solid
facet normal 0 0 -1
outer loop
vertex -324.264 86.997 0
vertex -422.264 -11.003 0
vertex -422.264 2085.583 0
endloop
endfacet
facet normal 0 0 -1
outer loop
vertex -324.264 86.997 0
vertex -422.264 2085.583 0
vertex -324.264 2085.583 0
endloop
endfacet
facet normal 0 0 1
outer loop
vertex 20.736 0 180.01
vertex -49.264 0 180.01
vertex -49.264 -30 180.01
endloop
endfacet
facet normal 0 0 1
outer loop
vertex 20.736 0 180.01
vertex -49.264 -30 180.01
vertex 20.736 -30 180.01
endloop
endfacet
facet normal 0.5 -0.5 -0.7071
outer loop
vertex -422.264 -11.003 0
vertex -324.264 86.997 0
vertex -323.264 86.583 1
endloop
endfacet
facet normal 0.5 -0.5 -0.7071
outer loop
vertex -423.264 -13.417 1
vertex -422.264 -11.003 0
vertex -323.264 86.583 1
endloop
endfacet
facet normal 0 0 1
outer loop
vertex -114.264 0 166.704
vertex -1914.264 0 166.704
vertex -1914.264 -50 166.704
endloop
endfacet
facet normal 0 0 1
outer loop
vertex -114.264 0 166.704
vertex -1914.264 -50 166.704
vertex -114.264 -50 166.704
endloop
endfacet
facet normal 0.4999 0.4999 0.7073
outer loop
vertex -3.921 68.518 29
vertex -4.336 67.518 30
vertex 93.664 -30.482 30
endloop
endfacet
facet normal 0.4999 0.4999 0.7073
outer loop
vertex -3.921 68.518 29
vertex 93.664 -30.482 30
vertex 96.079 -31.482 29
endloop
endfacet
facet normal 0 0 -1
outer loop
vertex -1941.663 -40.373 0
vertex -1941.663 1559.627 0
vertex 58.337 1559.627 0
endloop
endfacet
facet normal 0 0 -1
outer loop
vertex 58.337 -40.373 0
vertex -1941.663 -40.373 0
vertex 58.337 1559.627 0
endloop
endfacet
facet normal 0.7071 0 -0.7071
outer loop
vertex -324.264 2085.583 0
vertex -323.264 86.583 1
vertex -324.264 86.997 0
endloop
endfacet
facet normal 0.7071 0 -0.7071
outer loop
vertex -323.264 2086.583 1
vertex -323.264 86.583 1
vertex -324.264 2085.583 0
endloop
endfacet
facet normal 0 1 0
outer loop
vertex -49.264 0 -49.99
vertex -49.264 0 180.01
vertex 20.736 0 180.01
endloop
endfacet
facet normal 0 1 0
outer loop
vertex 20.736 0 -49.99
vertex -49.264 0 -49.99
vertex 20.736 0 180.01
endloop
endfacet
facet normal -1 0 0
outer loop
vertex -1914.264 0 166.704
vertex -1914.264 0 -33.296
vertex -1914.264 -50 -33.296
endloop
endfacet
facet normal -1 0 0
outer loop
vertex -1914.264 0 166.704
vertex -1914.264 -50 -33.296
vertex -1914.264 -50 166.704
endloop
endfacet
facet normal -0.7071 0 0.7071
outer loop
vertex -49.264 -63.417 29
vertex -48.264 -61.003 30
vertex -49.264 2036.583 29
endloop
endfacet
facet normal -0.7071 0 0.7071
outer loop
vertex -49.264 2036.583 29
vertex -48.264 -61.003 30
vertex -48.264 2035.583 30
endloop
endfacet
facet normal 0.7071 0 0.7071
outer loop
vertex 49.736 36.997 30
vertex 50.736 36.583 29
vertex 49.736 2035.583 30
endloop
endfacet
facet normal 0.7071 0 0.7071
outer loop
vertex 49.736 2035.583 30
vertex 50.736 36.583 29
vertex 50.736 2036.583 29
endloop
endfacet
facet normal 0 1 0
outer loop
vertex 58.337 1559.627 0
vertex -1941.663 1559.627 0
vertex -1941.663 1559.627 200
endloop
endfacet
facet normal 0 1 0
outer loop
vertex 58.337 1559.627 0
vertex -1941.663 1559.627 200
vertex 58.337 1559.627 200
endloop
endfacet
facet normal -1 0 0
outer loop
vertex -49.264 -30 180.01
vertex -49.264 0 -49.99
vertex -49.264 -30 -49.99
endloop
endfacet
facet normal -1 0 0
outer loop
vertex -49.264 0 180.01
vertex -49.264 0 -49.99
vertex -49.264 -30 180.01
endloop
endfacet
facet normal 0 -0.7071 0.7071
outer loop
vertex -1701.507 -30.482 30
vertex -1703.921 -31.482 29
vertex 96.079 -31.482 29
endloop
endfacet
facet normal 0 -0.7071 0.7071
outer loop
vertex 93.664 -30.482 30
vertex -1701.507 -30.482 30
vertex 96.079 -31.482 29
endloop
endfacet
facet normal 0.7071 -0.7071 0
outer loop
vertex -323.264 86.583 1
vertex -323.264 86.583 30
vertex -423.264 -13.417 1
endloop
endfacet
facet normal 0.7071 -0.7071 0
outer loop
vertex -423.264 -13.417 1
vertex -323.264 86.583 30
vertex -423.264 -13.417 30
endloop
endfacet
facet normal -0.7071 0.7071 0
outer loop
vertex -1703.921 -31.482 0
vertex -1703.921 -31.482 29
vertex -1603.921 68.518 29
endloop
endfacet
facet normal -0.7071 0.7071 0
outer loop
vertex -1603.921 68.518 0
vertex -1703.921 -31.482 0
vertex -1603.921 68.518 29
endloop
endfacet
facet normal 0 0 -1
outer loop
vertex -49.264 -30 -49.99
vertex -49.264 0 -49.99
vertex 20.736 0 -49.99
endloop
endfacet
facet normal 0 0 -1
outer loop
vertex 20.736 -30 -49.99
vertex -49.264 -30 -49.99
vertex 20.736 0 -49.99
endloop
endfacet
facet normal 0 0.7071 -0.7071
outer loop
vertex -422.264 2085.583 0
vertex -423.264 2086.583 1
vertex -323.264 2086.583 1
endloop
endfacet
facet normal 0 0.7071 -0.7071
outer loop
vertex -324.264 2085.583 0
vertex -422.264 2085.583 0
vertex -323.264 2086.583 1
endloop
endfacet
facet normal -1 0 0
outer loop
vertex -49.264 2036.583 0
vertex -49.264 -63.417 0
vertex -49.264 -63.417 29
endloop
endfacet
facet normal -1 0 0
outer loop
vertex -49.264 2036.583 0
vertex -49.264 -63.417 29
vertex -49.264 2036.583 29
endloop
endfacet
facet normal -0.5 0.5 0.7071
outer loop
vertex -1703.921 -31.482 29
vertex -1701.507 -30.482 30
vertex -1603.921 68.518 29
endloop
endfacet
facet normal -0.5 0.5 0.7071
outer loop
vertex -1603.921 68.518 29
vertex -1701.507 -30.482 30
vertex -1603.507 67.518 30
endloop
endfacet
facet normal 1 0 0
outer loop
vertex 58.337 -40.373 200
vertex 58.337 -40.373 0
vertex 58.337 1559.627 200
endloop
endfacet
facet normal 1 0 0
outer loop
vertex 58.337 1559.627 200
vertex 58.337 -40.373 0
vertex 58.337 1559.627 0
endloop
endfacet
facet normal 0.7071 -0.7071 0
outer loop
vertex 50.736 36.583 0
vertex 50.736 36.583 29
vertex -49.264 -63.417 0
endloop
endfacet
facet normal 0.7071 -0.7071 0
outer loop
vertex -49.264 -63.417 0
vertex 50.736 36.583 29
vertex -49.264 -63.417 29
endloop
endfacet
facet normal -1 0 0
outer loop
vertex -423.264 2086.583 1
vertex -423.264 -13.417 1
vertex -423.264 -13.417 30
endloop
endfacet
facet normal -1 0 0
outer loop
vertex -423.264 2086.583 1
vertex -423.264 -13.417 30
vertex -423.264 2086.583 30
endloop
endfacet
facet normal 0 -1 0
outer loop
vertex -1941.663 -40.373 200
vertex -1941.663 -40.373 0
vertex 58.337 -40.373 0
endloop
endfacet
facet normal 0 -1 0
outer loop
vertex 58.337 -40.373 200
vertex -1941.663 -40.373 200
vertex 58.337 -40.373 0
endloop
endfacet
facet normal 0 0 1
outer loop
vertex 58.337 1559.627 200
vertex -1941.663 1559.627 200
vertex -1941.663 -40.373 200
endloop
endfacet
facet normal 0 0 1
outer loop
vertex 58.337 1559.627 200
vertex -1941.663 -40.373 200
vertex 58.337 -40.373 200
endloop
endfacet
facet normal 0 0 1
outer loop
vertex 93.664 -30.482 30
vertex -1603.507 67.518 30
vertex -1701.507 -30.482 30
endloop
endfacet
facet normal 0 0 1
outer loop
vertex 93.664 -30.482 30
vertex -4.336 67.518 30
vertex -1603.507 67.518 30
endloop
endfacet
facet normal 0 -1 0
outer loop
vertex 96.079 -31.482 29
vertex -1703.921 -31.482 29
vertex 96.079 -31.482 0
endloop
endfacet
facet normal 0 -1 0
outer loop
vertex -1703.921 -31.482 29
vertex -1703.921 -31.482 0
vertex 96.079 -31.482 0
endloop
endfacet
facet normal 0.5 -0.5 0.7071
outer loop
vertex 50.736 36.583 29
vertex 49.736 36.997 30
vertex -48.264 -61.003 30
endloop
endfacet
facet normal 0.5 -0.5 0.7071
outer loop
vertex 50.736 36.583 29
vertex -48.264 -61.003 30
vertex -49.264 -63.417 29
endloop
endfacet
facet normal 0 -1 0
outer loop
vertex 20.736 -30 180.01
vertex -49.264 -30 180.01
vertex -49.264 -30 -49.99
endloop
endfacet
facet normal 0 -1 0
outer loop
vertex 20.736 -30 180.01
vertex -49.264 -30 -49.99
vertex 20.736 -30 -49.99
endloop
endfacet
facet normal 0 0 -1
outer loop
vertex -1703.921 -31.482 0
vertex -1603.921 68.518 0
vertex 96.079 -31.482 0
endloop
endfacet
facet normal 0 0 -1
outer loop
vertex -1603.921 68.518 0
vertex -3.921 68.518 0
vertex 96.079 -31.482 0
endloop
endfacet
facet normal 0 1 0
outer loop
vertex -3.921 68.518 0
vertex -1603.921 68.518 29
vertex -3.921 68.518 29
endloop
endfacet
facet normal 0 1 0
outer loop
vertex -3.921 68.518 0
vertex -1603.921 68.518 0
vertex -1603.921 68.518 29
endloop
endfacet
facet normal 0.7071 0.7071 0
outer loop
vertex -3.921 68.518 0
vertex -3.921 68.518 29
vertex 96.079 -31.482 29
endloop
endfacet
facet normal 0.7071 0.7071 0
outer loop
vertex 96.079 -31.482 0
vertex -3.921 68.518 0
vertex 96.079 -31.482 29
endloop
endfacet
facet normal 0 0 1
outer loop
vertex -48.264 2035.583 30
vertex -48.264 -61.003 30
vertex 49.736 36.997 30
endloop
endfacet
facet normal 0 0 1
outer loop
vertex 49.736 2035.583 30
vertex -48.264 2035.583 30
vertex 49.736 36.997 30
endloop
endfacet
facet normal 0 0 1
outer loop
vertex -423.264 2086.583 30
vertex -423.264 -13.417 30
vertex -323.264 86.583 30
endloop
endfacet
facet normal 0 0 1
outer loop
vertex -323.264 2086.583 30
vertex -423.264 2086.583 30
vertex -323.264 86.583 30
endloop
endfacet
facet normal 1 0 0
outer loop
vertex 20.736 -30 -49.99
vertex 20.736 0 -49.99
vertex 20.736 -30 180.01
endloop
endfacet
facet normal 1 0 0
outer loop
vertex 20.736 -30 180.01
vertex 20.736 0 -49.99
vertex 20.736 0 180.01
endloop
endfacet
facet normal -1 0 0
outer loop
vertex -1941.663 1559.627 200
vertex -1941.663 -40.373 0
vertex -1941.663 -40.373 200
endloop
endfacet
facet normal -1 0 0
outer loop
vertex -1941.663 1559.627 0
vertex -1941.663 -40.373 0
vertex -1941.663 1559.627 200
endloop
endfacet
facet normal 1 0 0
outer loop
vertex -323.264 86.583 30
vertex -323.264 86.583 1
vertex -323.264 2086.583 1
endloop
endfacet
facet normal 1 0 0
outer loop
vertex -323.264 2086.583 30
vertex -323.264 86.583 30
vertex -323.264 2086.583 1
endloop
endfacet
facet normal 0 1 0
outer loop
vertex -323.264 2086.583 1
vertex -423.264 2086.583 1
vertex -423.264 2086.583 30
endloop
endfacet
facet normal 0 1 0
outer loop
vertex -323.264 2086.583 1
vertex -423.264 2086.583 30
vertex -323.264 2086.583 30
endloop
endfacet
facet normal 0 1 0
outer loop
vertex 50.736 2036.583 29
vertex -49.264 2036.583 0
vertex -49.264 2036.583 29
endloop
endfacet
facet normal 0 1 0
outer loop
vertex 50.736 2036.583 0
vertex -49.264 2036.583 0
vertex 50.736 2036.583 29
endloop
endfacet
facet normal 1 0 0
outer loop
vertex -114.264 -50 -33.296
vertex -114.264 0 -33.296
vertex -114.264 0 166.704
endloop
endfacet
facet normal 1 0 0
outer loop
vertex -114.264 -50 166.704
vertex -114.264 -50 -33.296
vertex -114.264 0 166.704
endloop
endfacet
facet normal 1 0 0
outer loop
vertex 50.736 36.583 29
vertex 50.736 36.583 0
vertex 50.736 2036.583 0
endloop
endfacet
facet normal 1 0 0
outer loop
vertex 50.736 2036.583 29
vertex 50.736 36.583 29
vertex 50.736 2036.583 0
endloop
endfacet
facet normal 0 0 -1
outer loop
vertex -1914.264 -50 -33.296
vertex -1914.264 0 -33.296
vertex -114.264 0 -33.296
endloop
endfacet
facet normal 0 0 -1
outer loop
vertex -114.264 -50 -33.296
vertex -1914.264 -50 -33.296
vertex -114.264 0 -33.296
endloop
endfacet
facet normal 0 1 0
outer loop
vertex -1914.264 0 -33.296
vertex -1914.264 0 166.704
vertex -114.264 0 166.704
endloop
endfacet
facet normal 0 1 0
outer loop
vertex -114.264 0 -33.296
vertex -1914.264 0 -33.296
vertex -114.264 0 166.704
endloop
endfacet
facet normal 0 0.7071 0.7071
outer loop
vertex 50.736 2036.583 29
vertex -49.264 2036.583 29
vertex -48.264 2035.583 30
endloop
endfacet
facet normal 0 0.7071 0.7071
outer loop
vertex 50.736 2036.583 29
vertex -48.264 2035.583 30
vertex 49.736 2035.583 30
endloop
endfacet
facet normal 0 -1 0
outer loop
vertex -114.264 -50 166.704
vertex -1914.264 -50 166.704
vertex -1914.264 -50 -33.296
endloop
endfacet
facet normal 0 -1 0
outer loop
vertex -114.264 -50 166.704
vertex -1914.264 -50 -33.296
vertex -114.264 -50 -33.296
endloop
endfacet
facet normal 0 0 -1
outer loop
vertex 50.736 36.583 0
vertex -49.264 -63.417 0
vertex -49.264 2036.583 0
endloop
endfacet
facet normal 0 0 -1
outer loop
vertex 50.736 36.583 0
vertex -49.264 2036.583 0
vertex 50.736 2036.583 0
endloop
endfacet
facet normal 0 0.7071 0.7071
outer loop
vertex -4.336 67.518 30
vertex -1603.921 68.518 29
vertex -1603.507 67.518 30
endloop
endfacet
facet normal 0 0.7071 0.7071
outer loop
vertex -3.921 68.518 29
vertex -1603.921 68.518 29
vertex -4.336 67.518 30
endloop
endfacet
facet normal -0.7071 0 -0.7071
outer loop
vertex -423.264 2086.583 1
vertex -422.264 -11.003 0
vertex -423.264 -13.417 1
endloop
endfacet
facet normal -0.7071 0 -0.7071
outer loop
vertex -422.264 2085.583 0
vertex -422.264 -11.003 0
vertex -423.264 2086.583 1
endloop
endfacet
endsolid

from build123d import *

# Parameters (mm, degrees)
F0_W      = 1800
F0_H      = 200
F1_DEPTH  = 50
F2_W      = 100
F2_H      = 2100
F3_DEPTH  = 30
F4_W      = 70
F4_H      = 230
F5_DEPTH  = 30
F6_W      = 2000
F6_H      = 1600
F7_DEPTH  = 200
F8_W      = 1800
F8_H      = 100
F9_DEPTH  = 30
F11_DEPTH = 34
F12_SIZE  = 1
F13_SIZE  = 1
F14_SIZE  = 1
F16_DEPTH = 35
F18_SIZE  = 1
F19_SIZE  = 1
F20_SIZE  = 1
F21_SIZE  = 1


with BuildPart() as f1:
    # F0 (on Front) → F1 (new body)
    with BuildSketch(Plane.XZ):
        with Locations((-1014.2641052604, 66.7036272585)):
            Rectangle(F0_W, F0_H)
    extrude(amount=F1_DEPTH)


with BuildPart() as f3:
    # F2 (on Top) → F3 (new body)
    with BuildSketch(Plane.XY):
        with Locations((0.7358856499, 986.5826621652)):
            Rectangle(F2_W, F2_H)
    extrude(amount=F3_DEPTH)

    # F15 (on face) → F16 (cut)
    with BuildSketch(Plane.XY.offset(30)):
        Polygon((50.7358856499, -63.4173378348), (50.7358856499, 36.5826621652), (-49.2641143501, -63.4173378348), align=None)
    extrude(amount=-F16_DEPTH, mode=Mode.SUBTRACT)


with BuildPart() as f5:
    # F4 (on Front) → F5 (new body)
    with BuildSketch(Plane.XZ):
        with Locations((-14.2641143501, 65.0100798905)):
            Rectangle(F4_W, F4_H)
    extrude(amount=F5_DEPTH)


with BuildPart() as f7:
    # F6 (on Top) → F7 (new body)
    with BuildSketch(Plane.XY):
        with Locations((-941.6633024812, 759.6270173788)):
            Rectangle(F6_W, F6_H)
    extrude(amount=F7_DEPTH)


with BuildPart() as f9:
    # F8 (on Top) → F9 (new body)
    with BuildSketch(Plane.XY):
        with Locations((-803.9213657379, 18.5181453824)):
            Rectangle(F8_W, F8_H)
    extrude(amount=F9_DEPTH)

    # F10 (on face) → F11 (cut)
    with BuildSketch(Plane.XY.offset(30)):
        Polygon((-1703.9213657379, -31.4818546176), (-1603.9213657379, 68.5181453824), (-1703.9213657379, 68.5181453824), (-1703.9213657379, 63.0305334926), align=None)
        Polygon((96.0786342621, 68.5181453824), (-3.9213657379, 68.5181453824), (96.0786342621, -31.4818546176), align=None)
    extrude(amount=-F11_DEPTH, mode=Mode.SUBTRACT)

    # F12
    f12_edges = [f9.edges().sort_by_distance(p)[0] for p in [
        (-1653.921366, 18.518145, 30),
        (46.078634, 18.518145, 30),
    ]]
    chamfer(f12_edges, length=F12_SIZE)

    # F13
    f13_edges = [f9.edges().sort_by_distance(p)[0] for p in [
        (-803.921366, 68.518145, 30),
    ]]
    chamfer(f13_edges, length=F13_SIZE)

    # F14
    f14_edges = [f9.edges().sort_by_distance(p)[0] for p in [
        (-803.921366, -31.481855, 30),
    ]]
    chamfer(f14_edges, length=F14_SIZE)


with BuildPart() as f17_1:
    # F17: copy of F3
    add(f3.part.moved(Location((-374, 50, 0))))

    # F20
    f20_edges = [f17_1.edges().sort_by_distance(p)[0] for p in [
        (-373.264114, 36.582662, 0),
        (-323.264114, 1086.582662, 0),
    ]]
    chamfer(f20_edges, length=F20_SIZE)

    # F21
    f21_edges = [f17_1.edges().sort_by_distance(p)[0] for p in [
        (-373.764114, 2086.582662, 0),
        (-423.264114, 1037.289769, 0),
    ]]
    chamfer(f21_edges, length=F21_SIZE)


with BuildPart() as f3_1:
    add(f3.part)

    # F18
    f18_edges = [f3_1.edges().sort_by_distance(p)[0] for p in [
        (50.735886, 1036.582662, 30),
        (0.735886, -13.417338, 30),
    ]]
    chamfer(f18_edges, length=F18_SIZE)

    # F19
    f19_edges = [f3_1.edges().sort_by_distance(p)[0] for p in [
        (-49.264114, 987.289769, 30),
        (0.235886, 2036.582662, 30),
    ]]
    chamfer(f19_edges, length=F19_SIZE)


solid = Compound([f1.part, f5.part, f7.part, f9.part, f17_1.part, f3_1.part])
